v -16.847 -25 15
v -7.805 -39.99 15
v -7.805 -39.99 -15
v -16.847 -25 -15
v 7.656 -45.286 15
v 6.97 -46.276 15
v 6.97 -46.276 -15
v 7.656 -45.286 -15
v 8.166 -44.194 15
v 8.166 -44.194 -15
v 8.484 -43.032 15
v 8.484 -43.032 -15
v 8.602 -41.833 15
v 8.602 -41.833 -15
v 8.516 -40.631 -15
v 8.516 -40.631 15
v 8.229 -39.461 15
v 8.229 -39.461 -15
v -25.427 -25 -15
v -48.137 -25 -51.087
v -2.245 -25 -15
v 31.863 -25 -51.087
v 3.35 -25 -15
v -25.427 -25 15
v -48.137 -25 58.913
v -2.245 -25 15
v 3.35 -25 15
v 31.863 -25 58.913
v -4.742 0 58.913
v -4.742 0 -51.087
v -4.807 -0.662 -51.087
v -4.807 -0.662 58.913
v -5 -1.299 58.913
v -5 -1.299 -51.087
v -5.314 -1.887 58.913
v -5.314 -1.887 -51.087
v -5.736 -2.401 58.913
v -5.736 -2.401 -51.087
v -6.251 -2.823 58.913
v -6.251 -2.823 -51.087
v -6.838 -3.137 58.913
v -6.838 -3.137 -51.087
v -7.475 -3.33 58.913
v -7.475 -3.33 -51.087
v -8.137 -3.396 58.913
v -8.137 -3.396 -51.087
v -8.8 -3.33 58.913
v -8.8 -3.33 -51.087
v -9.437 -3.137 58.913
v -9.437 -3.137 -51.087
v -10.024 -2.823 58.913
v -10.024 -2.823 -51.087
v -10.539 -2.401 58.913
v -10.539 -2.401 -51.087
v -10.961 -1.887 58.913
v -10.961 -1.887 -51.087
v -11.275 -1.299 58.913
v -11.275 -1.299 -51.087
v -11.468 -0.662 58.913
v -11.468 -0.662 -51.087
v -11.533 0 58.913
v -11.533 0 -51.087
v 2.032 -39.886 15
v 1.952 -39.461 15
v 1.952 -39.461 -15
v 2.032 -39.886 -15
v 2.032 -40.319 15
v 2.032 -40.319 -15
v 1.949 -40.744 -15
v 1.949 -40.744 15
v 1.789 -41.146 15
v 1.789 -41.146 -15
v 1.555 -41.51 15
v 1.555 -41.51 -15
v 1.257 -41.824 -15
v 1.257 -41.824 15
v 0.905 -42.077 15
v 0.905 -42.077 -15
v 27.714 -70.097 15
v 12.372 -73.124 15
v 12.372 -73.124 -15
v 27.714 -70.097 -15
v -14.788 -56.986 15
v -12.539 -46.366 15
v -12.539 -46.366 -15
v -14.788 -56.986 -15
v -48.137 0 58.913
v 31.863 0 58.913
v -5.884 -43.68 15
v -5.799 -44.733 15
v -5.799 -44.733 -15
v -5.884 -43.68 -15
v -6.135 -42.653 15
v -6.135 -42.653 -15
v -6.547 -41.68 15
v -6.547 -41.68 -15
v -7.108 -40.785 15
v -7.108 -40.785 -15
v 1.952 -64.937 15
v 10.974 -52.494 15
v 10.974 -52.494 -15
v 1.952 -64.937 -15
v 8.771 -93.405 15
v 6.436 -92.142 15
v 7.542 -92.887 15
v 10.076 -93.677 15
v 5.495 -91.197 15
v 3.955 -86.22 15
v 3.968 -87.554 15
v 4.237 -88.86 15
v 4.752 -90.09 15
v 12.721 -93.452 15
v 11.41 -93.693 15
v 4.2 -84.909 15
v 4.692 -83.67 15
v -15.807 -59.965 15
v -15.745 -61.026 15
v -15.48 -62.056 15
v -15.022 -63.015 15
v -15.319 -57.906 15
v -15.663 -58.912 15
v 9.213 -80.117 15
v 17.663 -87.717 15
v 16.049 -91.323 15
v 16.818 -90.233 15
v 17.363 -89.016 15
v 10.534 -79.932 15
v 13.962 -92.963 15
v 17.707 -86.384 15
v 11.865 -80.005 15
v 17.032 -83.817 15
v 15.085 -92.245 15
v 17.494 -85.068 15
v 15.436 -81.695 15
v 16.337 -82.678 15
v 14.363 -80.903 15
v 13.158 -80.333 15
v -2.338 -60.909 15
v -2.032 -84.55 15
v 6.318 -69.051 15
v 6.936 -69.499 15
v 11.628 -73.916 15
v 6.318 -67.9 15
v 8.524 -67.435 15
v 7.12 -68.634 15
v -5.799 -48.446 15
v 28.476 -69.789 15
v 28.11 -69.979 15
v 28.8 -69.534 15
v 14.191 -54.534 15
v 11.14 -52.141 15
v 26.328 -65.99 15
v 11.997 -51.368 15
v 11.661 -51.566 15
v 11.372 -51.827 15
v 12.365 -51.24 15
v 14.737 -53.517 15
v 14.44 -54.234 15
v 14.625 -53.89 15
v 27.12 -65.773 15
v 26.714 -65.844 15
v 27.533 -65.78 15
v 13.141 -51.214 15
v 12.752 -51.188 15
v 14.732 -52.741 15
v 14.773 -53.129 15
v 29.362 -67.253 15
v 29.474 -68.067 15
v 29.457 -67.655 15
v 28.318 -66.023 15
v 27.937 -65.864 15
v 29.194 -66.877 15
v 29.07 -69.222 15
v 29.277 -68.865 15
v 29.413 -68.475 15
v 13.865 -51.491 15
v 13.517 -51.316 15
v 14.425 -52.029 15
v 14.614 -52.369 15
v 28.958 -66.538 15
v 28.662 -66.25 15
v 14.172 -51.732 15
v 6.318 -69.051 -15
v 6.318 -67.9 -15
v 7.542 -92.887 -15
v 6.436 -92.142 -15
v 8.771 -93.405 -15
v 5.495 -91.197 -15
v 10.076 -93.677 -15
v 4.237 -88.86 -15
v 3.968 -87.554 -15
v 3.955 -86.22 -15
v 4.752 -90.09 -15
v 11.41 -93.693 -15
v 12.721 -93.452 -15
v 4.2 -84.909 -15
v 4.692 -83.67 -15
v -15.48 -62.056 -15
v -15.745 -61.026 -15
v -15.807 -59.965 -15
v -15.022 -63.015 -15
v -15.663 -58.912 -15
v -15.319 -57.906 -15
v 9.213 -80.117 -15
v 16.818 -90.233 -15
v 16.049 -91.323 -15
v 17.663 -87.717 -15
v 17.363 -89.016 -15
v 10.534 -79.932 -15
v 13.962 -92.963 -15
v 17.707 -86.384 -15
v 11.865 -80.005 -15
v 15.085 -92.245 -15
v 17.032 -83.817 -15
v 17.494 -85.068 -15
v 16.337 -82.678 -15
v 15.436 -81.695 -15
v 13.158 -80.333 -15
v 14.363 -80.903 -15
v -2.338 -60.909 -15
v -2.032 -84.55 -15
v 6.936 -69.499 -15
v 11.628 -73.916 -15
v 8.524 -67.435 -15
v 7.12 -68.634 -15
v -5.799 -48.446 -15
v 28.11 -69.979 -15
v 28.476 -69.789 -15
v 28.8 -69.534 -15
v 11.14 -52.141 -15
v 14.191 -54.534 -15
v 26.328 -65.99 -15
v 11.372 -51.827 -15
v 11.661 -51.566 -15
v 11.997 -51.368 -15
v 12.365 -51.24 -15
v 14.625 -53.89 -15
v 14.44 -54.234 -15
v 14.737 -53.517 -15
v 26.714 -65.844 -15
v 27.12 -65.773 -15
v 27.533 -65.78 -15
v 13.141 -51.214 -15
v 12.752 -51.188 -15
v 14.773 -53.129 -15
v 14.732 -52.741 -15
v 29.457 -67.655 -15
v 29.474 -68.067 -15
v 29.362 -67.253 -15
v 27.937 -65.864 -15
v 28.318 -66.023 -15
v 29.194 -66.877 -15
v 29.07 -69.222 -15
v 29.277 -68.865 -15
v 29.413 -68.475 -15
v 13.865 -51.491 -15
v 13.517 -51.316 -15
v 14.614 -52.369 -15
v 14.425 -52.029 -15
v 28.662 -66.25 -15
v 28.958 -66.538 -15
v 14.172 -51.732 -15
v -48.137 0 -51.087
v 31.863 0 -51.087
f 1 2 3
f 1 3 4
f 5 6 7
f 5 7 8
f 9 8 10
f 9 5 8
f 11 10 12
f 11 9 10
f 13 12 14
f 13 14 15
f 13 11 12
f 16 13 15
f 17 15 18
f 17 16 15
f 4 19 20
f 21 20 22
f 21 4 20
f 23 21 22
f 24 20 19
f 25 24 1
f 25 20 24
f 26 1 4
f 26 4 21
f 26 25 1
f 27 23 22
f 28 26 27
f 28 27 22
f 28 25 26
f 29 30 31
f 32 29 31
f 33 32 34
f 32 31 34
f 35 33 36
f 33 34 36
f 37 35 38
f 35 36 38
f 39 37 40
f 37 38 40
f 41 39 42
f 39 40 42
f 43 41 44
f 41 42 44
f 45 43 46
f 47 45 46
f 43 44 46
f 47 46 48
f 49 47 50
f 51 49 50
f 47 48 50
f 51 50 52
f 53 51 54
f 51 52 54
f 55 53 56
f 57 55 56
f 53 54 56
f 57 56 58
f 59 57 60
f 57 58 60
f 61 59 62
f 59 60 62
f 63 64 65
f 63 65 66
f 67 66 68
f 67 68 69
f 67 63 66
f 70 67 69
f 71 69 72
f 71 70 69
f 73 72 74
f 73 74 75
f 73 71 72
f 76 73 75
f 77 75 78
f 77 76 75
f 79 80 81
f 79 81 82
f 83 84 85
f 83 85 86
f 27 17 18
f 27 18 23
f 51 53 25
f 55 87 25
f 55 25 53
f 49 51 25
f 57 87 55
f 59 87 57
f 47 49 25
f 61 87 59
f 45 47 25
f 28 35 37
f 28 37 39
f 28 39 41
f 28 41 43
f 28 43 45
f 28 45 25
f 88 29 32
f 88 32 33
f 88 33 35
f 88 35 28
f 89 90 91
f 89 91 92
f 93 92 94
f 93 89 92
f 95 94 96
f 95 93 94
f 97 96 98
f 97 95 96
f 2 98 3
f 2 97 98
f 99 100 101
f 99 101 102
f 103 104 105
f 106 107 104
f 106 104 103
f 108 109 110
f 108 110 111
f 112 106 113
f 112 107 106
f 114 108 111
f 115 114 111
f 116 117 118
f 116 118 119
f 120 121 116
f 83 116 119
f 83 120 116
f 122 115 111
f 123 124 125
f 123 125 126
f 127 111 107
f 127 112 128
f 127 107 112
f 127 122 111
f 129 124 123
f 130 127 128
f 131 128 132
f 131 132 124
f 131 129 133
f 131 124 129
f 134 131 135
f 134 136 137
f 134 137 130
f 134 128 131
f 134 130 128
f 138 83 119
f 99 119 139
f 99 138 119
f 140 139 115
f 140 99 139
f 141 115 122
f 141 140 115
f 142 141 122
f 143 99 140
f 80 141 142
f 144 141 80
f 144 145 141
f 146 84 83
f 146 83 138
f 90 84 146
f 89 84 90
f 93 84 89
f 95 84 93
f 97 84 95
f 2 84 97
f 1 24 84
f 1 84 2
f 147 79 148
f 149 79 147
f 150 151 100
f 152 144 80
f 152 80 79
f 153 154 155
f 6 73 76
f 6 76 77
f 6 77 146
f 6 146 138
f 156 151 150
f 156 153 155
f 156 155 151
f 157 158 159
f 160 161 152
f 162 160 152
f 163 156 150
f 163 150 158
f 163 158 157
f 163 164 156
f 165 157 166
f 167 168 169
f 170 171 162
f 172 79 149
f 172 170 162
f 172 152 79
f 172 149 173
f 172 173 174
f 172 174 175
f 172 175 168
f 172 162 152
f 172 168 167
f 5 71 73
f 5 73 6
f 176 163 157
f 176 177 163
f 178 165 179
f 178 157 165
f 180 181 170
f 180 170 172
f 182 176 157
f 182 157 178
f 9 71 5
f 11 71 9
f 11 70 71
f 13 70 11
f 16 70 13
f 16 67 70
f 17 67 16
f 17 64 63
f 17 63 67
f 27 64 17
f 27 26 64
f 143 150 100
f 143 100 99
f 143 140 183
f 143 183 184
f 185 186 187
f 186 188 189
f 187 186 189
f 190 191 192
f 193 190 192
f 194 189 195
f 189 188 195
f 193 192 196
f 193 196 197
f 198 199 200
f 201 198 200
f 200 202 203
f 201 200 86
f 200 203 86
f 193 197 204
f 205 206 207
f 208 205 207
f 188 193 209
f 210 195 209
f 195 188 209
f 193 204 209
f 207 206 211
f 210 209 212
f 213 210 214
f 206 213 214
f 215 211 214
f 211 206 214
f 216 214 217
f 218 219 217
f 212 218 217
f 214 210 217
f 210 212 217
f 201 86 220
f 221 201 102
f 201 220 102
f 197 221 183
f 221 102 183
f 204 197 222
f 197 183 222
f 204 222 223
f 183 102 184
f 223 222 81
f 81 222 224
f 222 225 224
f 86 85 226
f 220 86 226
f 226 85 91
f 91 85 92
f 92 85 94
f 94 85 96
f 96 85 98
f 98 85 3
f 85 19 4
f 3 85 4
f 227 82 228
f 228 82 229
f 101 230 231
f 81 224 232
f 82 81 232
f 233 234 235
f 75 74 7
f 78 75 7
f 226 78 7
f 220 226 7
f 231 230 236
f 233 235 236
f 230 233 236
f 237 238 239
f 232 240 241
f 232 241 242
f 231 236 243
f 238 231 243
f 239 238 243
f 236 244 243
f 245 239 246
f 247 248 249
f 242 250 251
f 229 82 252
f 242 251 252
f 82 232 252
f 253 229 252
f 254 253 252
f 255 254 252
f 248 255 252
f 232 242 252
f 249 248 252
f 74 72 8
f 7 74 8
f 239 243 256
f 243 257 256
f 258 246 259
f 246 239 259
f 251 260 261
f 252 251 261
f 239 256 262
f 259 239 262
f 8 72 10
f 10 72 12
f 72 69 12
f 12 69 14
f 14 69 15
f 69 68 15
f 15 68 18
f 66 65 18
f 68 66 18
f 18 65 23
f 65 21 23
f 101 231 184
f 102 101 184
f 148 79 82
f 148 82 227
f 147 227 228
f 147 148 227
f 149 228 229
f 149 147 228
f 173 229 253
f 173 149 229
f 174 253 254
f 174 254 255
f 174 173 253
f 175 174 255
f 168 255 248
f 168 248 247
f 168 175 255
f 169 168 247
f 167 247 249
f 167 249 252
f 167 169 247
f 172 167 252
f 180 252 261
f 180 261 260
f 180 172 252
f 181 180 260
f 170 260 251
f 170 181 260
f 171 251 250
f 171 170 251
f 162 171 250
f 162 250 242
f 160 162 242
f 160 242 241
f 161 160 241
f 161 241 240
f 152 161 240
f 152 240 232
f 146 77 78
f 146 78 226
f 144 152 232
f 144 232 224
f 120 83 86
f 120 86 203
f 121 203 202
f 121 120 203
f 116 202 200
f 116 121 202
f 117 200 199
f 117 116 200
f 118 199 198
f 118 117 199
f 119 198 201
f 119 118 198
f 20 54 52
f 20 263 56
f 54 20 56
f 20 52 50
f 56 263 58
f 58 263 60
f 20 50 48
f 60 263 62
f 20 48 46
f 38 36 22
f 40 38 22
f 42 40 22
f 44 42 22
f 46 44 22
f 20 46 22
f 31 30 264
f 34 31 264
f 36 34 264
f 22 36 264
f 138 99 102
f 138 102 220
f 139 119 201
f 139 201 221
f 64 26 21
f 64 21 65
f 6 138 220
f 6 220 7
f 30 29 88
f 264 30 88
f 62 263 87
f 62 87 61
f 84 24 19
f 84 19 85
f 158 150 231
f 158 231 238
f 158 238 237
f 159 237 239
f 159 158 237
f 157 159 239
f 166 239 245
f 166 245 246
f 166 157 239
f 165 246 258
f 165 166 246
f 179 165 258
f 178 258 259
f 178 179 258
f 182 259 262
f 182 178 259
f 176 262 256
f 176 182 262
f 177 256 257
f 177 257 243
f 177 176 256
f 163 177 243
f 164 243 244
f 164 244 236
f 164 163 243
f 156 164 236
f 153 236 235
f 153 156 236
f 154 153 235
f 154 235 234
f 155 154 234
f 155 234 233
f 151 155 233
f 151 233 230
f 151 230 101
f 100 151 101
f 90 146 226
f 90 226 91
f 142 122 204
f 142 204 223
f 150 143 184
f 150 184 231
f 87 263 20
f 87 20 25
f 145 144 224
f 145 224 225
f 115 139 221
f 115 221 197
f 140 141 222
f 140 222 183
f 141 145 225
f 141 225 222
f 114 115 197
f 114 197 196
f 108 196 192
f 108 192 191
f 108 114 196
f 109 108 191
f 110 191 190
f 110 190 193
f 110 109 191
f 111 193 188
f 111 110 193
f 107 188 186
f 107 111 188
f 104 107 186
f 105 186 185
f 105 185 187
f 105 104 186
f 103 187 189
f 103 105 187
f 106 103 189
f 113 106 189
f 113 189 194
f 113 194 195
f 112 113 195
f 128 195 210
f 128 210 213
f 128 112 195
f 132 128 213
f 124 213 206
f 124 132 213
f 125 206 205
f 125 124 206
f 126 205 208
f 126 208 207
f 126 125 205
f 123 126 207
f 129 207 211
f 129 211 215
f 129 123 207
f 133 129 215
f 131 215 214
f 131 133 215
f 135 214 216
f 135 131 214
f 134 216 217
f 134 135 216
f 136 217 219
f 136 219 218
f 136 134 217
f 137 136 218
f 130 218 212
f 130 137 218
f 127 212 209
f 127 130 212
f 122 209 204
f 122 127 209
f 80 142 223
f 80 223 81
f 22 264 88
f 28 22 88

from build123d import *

# Parameters (mm, degrees)
F0_W     = 80
F0_H     = 110
F1_DEPTH = 25
F3_DEPTH = 122.9
F5_DEPTH = 15


with BuildPart() as f1:
    # F0 (on Front) → F1 (new body)
    with BuildSketch(Plane.XZ):
        with Locations((-8.13742, 3.912851)):
            Rectangle(F0_W, F0_H)
    extrude(amount=F1_DEPTH)

    # F2 (on face) → F3 (cut)
    with BuildSketch(Plane(origin=(0, 0, -51.087149), x_dir=(1, 0, 0), z_dir=(0, 0, -1))):
        with BuildLine():
            ThreePointArc((-11.533121, 0), (-8.13742, -3.395701), (-4.741719, 0))
            Line((-4.741719, 0), (-11.533121, 0))
        make_face()
        with BuildLine():
            Line((-11.533121, 0), (-4.741719, 0))
            ThreePointArc((-4.741719, 0), (-8.13742, 3.395701), (-11.533121, 0))
        make_face()
    extrude(amount=-F3_DEPTH, mode=Mode.SUBTRACT)

    # F4 (on Top) → F5 (join, symmetric)
    with BuildSketch(Plane.XY):
        with BuildLine():
            Line((-25.619638, -24.679836), (-12.538977, -46.366195))
            Line((-12.538977, -46.366195), (-14.788412, -56.985627))
            ThreePointArc((-14.788412, -56.985627), (-15.806818, -59.965228), (-15.021523, -63.014571))
            Line((-15.021523, -63.014571), (-2.031637, -84.550433))
            Line((-2.031637, -84.550433), (4.691661, -83.66965))
            ThreePointArc((4.691661, -83.66965), (15.085472, -92.244671), (9.213005, -80.117164))
            Line((9.213005, -80.117164), (11.628102, -73.915706))
            Line((11.628102, -73.915706), (12.371922, -73.123584))
            Line((12.371922, -73.123584), (27.714186, -70.096895))
            ThreePointArc((27.714186, -70.096895), (29.362088, -67.253343), (26.327906, -65.990366))
            Line((26.327906, -65.990366), (8.524408, -67.434899))
            Line((8.524408, -67.434899), (7.119579, -68.6341))
            Line((7.119579, -68.6341), (6.93642, -69.498782))
            Line((6.93642, -69.498782), (6.318386, -69.050649))
            Line((6.318386, -69.050649), (6.318386, -67.899771))
            Line((6.318386, -67.899771), (14.191412, -54.533935))
            ThreePointArc((14.191412, -54.533935), (13.865423, -51.491249), (10.974195, -52.49375))
            Line((10.974195, -52.49375), (1.951577, -64.937122))
            Line((1.951577, -64.937122), (-2.338045, -60.909065))
            Line((-2.338045, -60.909065), (6.969567, -46.276149))
            ThreePointArc((6.969567, -46.276149), (8.484232, -43.032088), (8.229074, -39.460949))
            Line((8.229074, -39.460949), (3.24195, -24.679836))
            Line((3.24195, -24.679836), (-2.338045, -24.679836))
            Line((-2.338045, -24.679836), (1.951577, -39.460949))
            ThreePointArc((1.951577, -39.460949), (1.878572, -40.948809), (0.905328, -42.076573))
            Line((0.905328, -42.076573), (-5.799454, -48.446116))
            Line((-5.799454, -48.446116), (-5.799454, -44.733086))
            ThreePointArc((-5.799454, -44.733086), (-6.321583, -42.158323), (-7.805476, -39.990356))
            Line((-7.805476, -39.990356), (-17.040393, -24.679836))
            Line((-17.040393, -24.679836), (-25.619638, -24.679836))
        make_face()
    extrude(amount=F5_DEPTH, both=True)


solid = f1.part
